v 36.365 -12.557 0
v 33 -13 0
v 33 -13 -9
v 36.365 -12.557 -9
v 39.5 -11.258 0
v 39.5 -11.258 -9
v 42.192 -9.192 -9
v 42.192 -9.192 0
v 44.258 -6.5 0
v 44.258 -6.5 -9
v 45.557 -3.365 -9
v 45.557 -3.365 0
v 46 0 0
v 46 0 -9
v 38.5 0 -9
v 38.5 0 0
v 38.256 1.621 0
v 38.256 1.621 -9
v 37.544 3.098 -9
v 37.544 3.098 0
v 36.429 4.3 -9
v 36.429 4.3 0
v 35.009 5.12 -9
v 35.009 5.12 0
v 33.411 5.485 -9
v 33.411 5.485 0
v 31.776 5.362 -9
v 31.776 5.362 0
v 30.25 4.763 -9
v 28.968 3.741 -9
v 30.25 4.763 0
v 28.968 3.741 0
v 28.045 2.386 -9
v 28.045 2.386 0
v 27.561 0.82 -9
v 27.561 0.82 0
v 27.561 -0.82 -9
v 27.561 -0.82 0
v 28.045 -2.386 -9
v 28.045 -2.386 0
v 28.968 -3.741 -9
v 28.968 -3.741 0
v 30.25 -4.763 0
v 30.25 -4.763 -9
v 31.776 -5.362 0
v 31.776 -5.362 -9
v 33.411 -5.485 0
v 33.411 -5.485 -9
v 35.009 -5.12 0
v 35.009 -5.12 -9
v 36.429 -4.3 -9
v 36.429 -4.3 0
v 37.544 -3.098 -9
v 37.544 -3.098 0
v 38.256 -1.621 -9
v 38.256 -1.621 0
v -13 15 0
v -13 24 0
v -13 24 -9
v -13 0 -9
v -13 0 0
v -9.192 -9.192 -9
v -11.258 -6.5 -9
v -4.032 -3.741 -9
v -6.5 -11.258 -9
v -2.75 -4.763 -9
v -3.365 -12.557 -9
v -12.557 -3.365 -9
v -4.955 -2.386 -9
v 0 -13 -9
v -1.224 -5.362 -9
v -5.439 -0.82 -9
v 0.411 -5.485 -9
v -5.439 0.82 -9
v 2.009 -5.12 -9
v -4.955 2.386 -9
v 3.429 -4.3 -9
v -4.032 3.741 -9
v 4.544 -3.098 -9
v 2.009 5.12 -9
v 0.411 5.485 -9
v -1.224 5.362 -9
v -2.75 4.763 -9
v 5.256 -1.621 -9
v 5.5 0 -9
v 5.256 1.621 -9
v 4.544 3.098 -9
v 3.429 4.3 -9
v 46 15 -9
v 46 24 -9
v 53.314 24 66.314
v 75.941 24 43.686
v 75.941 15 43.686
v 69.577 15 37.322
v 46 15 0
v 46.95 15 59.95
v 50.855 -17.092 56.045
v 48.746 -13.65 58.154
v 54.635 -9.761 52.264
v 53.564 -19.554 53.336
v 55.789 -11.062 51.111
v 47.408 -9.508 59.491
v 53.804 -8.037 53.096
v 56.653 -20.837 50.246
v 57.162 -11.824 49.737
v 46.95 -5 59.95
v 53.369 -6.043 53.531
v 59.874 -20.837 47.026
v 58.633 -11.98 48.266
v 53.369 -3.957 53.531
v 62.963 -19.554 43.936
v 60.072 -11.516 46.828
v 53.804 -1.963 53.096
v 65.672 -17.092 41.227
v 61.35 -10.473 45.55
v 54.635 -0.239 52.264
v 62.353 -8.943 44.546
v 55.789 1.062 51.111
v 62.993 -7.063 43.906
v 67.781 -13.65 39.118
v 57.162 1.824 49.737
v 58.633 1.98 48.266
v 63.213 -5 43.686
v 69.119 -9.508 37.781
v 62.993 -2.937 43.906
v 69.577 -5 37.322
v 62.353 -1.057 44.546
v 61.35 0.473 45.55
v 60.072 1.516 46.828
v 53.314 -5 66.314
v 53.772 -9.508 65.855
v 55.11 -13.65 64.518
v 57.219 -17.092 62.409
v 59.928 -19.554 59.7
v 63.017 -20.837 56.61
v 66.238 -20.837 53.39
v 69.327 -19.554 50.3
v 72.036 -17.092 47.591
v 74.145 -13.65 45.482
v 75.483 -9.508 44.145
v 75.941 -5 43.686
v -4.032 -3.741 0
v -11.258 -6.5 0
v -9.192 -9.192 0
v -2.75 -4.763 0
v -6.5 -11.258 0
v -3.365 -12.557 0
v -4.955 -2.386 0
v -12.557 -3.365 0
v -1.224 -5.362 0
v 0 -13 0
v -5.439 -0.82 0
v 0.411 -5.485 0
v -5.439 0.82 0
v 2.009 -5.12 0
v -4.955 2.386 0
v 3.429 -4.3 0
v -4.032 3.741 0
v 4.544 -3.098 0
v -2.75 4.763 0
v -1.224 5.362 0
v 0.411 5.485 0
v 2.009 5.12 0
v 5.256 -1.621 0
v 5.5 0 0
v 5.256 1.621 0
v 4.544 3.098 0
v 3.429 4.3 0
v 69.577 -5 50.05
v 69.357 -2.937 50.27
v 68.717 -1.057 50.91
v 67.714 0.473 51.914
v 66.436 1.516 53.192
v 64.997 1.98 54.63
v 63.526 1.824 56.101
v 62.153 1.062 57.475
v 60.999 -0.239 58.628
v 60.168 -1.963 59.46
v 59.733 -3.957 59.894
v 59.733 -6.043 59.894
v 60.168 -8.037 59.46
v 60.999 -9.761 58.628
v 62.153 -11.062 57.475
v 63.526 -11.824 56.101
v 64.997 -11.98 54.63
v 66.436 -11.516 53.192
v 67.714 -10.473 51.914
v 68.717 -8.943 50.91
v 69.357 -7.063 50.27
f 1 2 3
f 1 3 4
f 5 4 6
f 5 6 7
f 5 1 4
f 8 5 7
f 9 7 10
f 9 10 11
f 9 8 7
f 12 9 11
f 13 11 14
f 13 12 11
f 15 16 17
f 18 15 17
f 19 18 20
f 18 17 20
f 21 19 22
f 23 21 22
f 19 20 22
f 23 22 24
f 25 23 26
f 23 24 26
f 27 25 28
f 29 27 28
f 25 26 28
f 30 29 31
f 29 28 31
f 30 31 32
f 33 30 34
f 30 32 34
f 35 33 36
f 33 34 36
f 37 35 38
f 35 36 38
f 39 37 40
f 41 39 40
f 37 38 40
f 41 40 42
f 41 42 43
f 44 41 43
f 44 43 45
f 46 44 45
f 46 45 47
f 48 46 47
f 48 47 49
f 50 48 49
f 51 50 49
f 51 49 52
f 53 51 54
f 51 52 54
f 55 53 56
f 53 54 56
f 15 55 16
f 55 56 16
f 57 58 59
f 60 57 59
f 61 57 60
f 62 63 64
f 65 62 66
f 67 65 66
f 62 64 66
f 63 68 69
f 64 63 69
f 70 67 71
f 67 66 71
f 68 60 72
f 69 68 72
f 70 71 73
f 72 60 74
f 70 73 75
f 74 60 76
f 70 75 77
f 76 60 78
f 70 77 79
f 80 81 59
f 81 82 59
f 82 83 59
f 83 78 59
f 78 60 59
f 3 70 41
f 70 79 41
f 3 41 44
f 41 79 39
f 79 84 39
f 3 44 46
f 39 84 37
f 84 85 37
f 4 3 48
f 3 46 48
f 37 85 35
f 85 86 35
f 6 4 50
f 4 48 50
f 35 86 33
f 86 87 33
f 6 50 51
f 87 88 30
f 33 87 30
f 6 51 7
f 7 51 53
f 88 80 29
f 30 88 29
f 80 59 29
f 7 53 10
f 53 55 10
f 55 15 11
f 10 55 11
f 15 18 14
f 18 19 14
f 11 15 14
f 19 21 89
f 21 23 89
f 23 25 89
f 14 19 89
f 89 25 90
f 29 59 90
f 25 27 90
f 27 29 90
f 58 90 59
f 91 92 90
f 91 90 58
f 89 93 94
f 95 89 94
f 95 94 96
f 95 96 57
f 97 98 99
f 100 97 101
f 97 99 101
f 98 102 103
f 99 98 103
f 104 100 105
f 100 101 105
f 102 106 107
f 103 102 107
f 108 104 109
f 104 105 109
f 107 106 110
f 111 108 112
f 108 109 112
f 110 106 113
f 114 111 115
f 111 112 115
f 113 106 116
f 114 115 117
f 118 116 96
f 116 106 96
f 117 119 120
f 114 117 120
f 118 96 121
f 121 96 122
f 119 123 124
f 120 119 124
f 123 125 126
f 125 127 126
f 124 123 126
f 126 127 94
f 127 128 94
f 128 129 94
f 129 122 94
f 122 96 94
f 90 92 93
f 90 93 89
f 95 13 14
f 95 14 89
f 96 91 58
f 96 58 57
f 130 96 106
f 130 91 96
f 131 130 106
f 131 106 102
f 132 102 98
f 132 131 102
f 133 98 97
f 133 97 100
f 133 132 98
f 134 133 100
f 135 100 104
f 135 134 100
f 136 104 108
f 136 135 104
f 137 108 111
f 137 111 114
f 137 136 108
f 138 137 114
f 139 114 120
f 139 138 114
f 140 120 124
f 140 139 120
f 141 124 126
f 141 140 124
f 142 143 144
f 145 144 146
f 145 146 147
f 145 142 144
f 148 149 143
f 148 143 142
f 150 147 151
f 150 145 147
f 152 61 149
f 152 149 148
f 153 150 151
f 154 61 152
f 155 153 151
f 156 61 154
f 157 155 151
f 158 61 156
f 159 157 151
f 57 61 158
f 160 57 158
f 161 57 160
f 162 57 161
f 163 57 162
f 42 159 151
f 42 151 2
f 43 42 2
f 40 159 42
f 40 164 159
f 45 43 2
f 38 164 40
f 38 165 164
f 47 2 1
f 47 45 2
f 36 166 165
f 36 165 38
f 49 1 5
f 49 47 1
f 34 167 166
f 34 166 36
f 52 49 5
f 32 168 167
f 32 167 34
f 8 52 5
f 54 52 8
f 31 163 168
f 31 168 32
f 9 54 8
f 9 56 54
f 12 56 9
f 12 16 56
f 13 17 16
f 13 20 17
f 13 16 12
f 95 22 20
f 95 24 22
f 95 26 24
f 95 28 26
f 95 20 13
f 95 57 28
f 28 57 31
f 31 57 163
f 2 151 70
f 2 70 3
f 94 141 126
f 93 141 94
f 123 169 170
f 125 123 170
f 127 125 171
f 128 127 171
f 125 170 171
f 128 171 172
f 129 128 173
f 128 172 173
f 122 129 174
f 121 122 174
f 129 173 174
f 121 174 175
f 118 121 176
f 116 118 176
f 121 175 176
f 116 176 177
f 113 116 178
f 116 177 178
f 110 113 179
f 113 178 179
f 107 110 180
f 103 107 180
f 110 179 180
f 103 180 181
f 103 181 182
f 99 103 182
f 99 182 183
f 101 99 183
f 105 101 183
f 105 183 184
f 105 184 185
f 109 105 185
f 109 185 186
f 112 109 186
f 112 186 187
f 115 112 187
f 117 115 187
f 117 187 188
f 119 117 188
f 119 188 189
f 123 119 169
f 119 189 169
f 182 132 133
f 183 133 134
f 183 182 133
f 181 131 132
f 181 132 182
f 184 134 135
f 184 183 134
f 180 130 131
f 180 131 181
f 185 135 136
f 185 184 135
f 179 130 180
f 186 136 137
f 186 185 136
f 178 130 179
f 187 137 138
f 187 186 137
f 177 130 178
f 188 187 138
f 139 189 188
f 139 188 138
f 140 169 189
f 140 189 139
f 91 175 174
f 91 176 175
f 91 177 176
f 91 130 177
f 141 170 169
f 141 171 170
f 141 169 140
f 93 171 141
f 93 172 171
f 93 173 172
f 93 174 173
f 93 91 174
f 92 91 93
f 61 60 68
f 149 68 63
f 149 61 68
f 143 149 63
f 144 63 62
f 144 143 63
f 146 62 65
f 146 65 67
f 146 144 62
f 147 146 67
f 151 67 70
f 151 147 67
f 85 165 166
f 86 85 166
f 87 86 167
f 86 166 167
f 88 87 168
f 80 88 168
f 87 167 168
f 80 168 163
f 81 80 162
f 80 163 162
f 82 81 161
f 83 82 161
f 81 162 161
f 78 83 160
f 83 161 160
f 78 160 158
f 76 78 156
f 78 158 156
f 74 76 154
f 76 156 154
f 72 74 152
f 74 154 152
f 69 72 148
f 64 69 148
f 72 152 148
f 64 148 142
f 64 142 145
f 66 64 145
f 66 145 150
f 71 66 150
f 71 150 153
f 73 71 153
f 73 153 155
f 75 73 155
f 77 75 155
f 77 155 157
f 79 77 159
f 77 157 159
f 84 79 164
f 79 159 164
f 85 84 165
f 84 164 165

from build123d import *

# Parameters (mm, degrees)
F0_R     = 5.5
F1_DEPTH = 9
F3_DEPTH = 9
F4_R     = 7
F5_DEPTH = 9


with BuildPart() as f1:
    # F0 (on Top) → F1 (new body)
    with BuildSketch(Plane.XY):
        with BuildLine():
            Line((46, 24), (-13, 24))
            Line((-13, 24), (-13, 0))
            ThreePointArc((-13, 0), (-9.1923881554, -9.1923881554), (0, -13))
            Line((0, -13), (33, -13))
            ThreePointArc((33, -13), (42.1923881554, -9.1923881554), (46, 0))
            Line((46, 0), (46, 24))
        make_face()
        Circle(F0_R, mode=Mode.SUBTRACT)
        with Locations((33, 0)):
            Circle(F0_R, mode=Mode.SUBTRACT)
    extrude(amount=-F1_DEPTH)

    # F2 (on face) → F3 (join)
    with BuildSketch(Plane(origin=(0, 24, 0), x_dir=(-1, 0, 0), z_dir=(0, 1, 0))):
        Polygon((-75.941125497, 43.686291501), (-46, -9), (-46, 0), (13, 0), (-53.313708499, 66.313708499), align=None)
    extrude(amount=-F3_DEPTH)

    # F4 (on face) → F5 (join)
    with BuildSketch(Plane(origin=(59.813708499, 0, 59.813708499), x_dir=(0.7071067812, 0, -0.7071067812), z_dir=(0.7071067812, 0, 0.7071067812))):
        with BuildLine():
            Line((22.8076118446, -5), (22.8076118446, 15))
            Line((22.8076118446, 15), (-9.1923881554, 15))
            Line((-9.1923881554, 15), (-9.1923881554, -5))
            ThreePointArc((-9.1923881554, -5), (6.8076118446, -21), (22.8076118446, -5))
        make_face()
        with Locations((6.8076118446, -5)):
            Circle(F4_R, mode=Mode.SUBTRACT)
    extrude(amount=-F5_DEPTH)


solid = f1.part
